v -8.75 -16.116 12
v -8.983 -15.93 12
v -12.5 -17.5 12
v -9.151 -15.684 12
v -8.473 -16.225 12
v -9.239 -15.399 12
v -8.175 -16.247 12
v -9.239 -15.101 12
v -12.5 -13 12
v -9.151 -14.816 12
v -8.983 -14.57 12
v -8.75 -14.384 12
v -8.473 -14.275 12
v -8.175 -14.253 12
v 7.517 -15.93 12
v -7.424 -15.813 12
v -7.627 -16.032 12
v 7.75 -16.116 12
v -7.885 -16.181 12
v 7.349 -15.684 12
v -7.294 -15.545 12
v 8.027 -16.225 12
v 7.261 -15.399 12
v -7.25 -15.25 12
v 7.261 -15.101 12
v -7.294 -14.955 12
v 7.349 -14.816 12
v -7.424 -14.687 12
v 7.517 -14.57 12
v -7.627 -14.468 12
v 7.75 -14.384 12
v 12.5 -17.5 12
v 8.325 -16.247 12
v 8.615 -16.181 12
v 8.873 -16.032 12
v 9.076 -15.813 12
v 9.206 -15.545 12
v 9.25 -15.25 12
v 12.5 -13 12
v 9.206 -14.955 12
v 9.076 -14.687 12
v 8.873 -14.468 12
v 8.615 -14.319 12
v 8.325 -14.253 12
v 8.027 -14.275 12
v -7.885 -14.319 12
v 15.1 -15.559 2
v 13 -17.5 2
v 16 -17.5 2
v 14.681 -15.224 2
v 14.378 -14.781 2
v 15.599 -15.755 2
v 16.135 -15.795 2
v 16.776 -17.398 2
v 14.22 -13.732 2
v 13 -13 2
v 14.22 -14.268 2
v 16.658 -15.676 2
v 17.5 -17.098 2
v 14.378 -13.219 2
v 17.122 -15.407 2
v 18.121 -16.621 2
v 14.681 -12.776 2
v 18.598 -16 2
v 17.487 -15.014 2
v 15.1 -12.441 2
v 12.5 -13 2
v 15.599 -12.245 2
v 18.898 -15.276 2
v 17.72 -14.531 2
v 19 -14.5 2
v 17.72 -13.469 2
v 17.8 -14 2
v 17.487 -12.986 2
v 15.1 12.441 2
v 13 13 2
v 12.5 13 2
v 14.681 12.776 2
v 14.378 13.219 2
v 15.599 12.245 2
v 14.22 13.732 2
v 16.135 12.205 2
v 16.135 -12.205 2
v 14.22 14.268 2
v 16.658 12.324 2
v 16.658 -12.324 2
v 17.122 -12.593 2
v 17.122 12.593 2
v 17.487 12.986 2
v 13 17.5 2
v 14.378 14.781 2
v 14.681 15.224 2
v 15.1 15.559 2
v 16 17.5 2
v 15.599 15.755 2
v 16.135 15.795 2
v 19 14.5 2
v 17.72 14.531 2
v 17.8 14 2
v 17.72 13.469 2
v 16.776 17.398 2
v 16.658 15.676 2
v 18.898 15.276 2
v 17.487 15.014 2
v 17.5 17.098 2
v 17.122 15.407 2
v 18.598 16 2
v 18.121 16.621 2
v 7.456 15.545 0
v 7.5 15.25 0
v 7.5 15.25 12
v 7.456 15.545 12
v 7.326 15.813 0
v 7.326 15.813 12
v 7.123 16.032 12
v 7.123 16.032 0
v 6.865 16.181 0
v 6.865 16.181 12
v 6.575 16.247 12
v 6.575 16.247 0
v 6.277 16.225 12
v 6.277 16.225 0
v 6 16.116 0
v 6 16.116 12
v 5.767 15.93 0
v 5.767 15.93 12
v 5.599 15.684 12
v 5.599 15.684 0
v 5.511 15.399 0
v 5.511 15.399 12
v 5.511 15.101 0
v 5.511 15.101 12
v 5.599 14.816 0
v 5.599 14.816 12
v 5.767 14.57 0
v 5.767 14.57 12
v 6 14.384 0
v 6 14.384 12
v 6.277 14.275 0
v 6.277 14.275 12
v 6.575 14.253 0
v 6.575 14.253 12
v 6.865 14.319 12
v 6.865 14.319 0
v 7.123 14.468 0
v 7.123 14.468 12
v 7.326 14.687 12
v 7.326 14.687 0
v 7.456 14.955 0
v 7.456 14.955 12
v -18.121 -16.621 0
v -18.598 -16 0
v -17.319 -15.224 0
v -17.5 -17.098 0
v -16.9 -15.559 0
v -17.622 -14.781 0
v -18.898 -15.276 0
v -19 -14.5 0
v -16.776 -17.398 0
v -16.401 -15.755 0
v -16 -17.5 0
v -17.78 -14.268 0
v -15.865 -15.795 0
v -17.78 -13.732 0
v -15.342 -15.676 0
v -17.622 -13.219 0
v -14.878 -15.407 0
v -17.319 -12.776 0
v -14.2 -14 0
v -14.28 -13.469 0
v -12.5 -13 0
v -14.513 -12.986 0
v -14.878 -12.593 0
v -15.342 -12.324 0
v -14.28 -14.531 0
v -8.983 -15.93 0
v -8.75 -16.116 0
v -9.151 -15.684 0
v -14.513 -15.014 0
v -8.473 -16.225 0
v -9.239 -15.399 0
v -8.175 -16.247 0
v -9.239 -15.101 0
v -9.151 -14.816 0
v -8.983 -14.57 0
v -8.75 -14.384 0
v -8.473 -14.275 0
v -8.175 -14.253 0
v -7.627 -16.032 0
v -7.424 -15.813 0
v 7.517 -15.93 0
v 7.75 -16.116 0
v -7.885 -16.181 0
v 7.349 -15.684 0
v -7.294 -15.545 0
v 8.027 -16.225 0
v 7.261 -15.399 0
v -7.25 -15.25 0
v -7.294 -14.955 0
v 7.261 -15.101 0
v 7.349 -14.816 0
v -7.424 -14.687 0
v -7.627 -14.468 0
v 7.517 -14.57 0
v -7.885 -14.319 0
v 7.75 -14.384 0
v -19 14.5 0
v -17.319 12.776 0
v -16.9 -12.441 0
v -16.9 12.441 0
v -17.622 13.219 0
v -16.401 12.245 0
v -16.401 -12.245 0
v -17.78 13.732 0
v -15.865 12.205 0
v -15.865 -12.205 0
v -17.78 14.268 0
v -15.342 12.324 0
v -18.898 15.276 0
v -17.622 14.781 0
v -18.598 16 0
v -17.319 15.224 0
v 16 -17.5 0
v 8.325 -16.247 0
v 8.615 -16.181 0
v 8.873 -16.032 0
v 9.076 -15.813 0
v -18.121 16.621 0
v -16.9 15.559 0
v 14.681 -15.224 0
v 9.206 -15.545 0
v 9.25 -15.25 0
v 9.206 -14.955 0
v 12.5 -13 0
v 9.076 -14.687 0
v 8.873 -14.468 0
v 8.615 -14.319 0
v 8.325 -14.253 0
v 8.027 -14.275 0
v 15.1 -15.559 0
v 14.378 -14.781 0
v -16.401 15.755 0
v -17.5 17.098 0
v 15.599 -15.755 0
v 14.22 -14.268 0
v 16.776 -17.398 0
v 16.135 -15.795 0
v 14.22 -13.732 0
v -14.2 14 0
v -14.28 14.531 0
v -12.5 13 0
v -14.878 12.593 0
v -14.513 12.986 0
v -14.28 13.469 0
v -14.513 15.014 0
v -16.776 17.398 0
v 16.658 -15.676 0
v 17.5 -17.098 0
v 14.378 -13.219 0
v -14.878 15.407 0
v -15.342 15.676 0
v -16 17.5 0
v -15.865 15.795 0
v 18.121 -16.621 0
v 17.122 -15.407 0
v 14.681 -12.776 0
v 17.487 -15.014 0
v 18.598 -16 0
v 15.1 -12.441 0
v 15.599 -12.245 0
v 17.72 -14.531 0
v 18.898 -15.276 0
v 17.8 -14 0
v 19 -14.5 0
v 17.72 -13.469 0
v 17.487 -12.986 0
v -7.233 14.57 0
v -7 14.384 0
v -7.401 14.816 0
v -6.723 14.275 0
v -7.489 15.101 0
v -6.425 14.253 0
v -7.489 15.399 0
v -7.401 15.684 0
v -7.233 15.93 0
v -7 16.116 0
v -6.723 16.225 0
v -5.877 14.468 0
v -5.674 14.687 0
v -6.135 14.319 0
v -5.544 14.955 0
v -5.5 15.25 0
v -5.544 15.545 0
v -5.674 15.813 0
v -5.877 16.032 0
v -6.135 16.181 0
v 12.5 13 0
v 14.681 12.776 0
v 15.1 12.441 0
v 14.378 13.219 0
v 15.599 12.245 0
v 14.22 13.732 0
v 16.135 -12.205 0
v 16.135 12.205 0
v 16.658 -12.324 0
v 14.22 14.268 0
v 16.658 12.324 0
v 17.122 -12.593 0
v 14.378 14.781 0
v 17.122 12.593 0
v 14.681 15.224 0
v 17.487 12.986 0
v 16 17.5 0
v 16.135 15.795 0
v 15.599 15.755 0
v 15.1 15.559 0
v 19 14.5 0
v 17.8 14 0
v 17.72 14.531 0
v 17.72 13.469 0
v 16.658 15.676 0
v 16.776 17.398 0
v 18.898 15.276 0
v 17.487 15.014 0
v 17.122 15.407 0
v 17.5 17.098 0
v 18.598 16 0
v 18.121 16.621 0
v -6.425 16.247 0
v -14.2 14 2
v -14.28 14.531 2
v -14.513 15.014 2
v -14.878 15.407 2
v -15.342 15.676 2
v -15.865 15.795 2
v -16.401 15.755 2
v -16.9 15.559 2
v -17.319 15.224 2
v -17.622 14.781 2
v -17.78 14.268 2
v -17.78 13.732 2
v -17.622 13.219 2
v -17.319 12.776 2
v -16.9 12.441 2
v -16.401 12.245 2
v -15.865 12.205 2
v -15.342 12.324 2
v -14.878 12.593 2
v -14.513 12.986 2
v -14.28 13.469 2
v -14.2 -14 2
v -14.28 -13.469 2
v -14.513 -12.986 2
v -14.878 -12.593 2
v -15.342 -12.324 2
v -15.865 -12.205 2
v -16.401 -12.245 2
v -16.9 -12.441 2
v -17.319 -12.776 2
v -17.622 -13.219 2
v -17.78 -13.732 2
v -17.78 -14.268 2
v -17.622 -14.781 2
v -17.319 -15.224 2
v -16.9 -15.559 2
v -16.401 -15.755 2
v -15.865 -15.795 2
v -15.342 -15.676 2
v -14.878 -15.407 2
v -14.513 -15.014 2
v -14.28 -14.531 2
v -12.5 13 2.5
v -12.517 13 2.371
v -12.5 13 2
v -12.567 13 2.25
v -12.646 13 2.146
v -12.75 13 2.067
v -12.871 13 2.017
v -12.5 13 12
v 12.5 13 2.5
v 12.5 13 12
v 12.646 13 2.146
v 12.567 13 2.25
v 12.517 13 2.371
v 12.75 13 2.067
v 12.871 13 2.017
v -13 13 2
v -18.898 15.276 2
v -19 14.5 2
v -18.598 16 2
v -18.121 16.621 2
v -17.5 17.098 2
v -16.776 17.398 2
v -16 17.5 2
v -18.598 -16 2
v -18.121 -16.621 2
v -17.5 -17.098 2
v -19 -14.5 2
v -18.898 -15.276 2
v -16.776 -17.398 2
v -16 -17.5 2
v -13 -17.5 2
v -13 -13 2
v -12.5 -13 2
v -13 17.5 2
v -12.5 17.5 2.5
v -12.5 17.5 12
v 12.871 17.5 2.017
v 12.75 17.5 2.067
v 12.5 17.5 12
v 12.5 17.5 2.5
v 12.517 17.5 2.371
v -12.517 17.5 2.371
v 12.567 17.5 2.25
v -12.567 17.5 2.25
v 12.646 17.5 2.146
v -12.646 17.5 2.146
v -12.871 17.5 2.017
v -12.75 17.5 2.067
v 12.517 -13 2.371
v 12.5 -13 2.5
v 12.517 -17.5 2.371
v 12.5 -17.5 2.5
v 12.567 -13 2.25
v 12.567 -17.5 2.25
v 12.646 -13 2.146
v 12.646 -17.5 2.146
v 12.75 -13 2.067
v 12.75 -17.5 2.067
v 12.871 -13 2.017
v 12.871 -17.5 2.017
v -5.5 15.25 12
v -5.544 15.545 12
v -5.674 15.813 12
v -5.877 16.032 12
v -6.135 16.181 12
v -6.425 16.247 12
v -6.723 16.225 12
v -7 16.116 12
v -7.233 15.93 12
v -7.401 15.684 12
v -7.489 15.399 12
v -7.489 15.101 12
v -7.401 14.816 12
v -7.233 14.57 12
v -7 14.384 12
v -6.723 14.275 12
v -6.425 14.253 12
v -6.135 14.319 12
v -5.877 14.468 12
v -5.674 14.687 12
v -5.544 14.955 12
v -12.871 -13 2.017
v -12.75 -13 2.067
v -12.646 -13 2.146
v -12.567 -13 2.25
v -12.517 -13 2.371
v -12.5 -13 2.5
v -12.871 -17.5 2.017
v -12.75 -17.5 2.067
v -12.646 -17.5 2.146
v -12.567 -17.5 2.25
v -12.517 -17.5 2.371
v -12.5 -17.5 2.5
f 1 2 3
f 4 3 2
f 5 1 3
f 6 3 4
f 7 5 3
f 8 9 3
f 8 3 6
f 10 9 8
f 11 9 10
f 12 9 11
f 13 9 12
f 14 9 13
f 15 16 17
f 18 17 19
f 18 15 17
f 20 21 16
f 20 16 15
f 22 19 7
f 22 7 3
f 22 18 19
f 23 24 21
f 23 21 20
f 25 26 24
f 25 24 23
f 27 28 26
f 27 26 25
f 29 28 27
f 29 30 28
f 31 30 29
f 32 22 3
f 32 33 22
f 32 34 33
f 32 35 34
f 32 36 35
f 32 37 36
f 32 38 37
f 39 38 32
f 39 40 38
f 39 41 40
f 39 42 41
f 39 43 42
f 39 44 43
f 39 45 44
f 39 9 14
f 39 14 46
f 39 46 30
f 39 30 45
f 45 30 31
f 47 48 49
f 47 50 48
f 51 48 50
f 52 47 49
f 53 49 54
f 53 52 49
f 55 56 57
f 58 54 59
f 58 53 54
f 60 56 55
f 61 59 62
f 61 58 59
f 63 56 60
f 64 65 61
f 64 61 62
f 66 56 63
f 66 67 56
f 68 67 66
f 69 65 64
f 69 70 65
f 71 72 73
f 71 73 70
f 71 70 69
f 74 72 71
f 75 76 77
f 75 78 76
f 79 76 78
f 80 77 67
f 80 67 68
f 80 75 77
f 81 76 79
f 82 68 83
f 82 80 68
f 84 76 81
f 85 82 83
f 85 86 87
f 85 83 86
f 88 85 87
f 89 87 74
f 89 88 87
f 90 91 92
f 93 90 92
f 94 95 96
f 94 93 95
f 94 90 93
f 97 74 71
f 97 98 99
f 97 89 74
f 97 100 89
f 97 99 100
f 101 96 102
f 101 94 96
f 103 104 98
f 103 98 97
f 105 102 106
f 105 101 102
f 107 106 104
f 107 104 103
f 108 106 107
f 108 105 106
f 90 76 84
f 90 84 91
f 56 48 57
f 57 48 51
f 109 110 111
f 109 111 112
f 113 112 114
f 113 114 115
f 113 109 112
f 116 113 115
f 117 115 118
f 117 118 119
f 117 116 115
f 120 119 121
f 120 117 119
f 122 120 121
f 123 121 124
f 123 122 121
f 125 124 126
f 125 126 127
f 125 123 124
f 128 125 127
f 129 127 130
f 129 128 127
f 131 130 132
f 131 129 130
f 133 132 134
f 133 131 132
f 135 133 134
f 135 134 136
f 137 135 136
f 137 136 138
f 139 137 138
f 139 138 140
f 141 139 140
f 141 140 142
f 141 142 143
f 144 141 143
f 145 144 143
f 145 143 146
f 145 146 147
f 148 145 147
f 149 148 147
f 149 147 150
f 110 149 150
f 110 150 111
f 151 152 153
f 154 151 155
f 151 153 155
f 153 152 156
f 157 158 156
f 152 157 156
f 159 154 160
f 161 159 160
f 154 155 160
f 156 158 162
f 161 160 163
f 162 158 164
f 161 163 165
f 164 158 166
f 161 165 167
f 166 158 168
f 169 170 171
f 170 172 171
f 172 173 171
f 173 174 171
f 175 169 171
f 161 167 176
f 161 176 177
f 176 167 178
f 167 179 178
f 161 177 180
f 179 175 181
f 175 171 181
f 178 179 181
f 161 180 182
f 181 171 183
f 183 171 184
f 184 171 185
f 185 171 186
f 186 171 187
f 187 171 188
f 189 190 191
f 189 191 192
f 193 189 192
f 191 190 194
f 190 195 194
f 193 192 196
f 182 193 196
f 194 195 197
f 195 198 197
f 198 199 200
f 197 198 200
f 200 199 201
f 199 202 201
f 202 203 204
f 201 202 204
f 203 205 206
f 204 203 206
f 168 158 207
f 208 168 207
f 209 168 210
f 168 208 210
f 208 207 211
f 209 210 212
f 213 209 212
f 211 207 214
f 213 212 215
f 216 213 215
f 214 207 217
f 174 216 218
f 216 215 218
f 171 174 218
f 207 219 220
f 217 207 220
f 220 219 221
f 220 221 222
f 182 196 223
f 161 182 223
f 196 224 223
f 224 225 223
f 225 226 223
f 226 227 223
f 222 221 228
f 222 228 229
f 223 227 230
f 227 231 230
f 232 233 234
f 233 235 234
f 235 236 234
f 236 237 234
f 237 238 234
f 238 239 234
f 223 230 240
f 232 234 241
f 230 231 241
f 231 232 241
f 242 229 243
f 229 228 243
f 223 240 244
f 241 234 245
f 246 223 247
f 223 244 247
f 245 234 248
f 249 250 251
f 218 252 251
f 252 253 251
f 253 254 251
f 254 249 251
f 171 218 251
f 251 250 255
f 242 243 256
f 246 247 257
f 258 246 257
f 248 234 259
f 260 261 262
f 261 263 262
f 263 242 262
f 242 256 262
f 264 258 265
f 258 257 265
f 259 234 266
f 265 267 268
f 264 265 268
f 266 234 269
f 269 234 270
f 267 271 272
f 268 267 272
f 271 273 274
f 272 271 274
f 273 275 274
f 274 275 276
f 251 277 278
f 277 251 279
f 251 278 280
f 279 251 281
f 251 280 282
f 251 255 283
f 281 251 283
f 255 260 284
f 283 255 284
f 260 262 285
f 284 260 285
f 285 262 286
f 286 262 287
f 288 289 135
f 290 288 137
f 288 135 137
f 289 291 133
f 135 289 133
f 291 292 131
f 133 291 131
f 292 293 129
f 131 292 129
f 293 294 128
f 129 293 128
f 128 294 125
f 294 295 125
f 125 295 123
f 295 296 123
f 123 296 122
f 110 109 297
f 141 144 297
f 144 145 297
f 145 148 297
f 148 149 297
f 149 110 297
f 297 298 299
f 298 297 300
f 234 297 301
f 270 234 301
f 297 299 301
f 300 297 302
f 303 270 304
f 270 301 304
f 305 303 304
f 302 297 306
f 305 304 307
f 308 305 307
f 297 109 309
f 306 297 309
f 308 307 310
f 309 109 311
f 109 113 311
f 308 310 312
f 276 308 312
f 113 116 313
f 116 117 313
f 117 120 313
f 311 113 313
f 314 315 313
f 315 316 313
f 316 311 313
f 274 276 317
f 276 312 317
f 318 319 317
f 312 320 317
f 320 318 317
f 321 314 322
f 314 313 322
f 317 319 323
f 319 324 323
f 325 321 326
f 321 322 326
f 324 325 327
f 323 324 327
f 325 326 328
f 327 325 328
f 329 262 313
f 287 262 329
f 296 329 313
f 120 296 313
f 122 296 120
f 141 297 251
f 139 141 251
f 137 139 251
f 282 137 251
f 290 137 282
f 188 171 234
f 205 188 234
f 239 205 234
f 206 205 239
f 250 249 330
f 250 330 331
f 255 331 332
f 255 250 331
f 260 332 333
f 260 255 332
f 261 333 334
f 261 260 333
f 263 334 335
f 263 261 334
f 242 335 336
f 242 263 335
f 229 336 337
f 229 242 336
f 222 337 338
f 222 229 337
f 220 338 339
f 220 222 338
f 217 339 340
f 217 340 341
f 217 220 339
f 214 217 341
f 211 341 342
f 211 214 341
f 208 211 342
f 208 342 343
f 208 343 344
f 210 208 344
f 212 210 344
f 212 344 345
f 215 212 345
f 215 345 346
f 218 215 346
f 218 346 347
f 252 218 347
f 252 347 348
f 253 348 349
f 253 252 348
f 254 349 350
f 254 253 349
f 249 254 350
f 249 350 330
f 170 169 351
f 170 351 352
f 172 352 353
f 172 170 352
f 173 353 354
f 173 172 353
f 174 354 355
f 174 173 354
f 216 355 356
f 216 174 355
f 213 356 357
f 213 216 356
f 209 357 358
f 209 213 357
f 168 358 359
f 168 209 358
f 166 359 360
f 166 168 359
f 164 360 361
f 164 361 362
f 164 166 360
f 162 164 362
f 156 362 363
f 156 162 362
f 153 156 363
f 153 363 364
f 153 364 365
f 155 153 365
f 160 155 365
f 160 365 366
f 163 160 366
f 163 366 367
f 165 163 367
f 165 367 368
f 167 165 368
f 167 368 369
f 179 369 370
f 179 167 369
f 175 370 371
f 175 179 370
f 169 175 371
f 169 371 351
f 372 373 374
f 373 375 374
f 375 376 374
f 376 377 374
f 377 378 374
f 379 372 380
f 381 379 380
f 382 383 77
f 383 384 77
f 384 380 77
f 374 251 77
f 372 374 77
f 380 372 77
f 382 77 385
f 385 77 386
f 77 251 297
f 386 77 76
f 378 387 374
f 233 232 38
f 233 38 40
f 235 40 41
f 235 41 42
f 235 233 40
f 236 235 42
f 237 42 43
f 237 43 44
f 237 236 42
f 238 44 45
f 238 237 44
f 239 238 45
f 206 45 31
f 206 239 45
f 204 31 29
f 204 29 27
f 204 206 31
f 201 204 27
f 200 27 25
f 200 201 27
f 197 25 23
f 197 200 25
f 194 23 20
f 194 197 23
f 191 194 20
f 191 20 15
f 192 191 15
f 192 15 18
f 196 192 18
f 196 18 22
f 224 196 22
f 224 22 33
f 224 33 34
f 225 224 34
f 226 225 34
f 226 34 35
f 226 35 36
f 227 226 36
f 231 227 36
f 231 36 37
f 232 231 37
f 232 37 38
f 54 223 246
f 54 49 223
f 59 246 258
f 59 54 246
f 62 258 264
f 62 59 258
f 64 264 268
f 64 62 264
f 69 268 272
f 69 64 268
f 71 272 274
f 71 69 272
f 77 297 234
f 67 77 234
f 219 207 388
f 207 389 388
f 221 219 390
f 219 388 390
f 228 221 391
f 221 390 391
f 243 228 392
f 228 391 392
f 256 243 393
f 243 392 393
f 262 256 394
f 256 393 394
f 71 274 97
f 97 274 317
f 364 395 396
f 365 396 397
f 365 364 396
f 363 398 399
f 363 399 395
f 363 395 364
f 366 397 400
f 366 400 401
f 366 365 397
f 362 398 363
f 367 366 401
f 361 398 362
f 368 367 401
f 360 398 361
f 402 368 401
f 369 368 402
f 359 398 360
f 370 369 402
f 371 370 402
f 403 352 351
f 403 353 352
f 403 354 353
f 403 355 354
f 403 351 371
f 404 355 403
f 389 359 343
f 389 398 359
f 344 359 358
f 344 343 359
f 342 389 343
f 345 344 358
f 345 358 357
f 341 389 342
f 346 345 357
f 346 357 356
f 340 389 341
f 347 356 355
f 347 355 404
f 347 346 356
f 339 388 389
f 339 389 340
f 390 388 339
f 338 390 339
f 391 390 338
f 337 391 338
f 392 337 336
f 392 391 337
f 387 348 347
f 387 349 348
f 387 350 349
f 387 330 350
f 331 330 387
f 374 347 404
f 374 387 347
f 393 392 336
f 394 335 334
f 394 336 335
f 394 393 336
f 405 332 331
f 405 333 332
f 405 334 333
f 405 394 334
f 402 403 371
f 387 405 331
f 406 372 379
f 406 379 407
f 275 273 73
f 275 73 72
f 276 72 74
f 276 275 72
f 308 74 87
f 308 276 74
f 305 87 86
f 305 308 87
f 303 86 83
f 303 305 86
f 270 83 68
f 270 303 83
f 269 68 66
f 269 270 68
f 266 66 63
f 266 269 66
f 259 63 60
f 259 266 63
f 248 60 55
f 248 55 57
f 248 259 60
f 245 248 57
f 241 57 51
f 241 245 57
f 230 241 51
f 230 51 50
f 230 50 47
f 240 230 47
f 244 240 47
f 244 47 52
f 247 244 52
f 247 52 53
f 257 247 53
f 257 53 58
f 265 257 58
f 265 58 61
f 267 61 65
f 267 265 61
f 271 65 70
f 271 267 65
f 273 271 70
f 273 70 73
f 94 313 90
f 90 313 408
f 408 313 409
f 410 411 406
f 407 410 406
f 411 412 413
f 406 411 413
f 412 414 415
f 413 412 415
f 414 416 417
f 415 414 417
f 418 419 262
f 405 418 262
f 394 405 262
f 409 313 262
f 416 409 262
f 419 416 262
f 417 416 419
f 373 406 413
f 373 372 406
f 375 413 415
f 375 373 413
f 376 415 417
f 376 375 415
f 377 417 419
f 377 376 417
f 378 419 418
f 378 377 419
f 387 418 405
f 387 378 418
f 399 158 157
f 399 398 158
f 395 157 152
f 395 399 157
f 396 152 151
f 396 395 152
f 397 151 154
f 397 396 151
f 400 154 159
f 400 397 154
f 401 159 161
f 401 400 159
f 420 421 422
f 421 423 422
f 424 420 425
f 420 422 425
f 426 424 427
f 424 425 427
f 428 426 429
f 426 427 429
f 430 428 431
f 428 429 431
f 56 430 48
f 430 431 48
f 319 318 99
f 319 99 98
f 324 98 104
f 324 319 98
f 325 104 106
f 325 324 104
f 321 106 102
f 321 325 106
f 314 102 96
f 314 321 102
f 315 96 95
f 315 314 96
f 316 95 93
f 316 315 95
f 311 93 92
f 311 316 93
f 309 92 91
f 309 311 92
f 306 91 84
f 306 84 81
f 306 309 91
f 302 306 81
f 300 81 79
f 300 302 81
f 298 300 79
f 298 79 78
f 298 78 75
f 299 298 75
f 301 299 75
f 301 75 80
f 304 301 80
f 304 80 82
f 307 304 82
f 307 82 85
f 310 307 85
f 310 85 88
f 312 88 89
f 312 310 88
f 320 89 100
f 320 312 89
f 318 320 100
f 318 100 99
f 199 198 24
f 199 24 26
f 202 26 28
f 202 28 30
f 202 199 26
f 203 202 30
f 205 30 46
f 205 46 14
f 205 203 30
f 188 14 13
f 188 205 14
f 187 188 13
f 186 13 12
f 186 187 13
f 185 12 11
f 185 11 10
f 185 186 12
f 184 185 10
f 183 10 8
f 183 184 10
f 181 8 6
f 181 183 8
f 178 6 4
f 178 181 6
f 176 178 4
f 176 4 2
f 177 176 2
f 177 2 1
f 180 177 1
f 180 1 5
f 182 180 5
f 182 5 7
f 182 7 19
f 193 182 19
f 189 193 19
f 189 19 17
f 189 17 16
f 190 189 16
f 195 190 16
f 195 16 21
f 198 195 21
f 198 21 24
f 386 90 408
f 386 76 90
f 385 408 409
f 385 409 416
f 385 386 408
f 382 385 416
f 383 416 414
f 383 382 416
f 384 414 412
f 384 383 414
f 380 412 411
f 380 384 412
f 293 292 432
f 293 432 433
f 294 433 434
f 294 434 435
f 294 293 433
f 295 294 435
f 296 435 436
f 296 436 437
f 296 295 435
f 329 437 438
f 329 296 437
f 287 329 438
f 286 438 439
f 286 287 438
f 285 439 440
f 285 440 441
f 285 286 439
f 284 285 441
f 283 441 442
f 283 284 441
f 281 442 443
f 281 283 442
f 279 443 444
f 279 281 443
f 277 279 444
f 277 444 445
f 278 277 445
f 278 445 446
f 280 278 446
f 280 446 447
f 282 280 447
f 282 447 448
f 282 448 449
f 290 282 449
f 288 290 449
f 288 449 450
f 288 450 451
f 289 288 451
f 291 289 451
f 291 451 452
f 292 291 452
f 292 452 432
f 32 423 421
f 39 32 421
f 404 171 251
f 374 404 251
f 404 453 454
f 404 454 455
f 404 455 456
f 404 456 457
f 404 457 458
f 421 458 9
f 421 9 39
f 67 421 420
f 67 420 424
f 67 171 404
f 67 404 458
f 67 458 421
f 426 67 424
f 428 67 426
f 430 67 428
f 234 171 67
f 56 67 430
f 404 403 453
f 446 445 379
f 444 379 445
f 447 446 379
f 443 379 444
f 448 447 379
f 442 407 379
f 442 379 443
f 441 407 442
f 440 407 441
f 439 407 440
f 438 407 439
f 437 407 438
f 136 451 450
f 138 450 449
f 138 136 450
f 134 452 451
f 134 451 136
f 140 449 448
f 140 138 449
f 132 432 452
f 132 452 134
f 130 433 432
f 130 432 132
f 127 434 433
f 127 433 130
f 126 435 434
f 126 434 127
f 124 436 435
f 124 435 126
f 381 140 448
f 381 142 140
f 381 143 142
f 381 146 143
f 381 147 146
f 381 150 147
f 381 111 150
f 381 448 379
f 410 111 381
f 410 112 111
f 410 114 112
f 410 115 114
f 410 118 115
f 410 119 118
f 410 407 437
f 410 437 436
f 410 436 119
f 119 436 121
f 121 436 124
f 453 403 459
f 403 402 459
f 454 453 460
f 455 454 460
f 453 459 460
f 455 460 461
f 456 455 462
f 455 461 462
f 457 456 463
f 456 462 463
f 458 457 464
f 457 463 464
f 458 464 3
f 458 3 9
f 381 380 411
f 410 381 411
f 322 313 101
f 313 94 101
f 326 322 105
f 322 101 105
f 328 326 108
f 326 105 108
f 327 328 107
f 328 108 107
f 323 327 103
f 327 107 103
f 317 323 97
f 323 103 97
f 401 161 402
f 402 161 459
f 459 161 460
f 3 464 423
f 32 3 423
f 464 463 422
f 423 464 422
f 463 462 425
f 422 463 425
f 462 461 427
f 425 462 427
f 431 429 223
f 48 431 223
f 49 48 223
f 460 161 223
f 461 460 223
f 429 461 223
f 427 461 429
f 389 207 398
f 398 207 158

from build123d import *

# Parameters (mm, degrees)
F0_R     = 1.8
F0_W     = 25
F0_H     = 4.5
F0_R_2   = 1
F1_DEPTH = 2
F2_R     = 3
F3_DEPTH = 12
F4_R     = 0.5


with BuildPart() as f1:
    # F0 (on Top) → F1 (new body)
    with BuildSketch(Plane.XY):
        Polygon((-12.5, 17.5), (-19, 17.5), (-19, -17.5), (-12.5, -17.5), (-12.5, -13), (-12.5, 13), align=None)
        with Locations((-16, -14)):
            Circle(F0_R, mode=Mode.SUBTRACT)
        with Locations((-16, 14)):
            Circle(F0_R, mode=Mode.SUBTRACT)
        Polygon((19, 17.5), (12.5, 17.5), (12.5, 13), (12.5, -13), (12.5, -17.5), (19, -17.5), align=None)
        with Locations((16, -14)):
            Circle(F0_R, mode=Mode.SUBTRACT)
        with Locations((16, 14)):
            Circle(F0_R, mode=Mode.SUBTRACT)
        with Locations((0, 15.25)):
            Rectangle(F0_W, F0_H)
        with Locations((-6.5, 15.25)):
            Circle(F0_R_2, mode=Mode.SUBTRACT)
        with Locations((6.5, 15.25)):
            Circle(F0_R_2, mode=Mode.SUBTRACT)
        with Locations((0, -15.25)):
            Rectangle(F0_W, F0_H)
        with Locations((-8.25, -15.25)):
            Circle(F0_R_2, mode=Mode.SUBTRACT)
        with Locations((8.25, -15.25)):
            Circle(F0_R_2, mode=Mode.SUBTRACT)
    extrude(amount=F1_DEPTH)

    # F2
    f2_edges = [f1.edges().sort_by_distance(p)[0] for p in [
        (-19, 17.5, 1),
        (19, 17.5, 1),
        (19, -17.5, 1),
        (-19, -17.5, 1),
    ]]
    fillet(f2_edges, radius=F2_R)

    # F0 (on Top) → F3 (join)
    with BuildSketch(Plane.XY):
        with Locations((0, 15.25)):
            Rectangle(F0_W, F0_H)
        with Locations((-6.5, 15.25)):
            Circle(F0_R_2, mode=Mode.SUBTRACT)
        with Locations((6.5, 15.25)):
            Circle(F0_R_2, mode=Mode.SUBTRACT)
        with Locations((0, -15.25)):
            Rectangle(F0_W, F0_H)
        with Locations((-8.25, -15.25)):
            Circle(F0_R_2, mode=Mode.SUBTRACT)
        with Locations((8.25, -15.25)):
            Circle(F0_R_2, mode=Mode.SUBTRACT)
    extrude(amount=F3_DEPTH)

    # F4
    f4_edges = [f1.edges().sort_by_distance(p)[0] for p in [
        (-12.5, 15.25, 2),
        (-12.5, -15.25, 2),
        (12.5, 15.25, 2),
        (12.5, -15.25, 2),
    ]]
    fillet(f4_edges, radius=F4_R)


solid = f1.part
